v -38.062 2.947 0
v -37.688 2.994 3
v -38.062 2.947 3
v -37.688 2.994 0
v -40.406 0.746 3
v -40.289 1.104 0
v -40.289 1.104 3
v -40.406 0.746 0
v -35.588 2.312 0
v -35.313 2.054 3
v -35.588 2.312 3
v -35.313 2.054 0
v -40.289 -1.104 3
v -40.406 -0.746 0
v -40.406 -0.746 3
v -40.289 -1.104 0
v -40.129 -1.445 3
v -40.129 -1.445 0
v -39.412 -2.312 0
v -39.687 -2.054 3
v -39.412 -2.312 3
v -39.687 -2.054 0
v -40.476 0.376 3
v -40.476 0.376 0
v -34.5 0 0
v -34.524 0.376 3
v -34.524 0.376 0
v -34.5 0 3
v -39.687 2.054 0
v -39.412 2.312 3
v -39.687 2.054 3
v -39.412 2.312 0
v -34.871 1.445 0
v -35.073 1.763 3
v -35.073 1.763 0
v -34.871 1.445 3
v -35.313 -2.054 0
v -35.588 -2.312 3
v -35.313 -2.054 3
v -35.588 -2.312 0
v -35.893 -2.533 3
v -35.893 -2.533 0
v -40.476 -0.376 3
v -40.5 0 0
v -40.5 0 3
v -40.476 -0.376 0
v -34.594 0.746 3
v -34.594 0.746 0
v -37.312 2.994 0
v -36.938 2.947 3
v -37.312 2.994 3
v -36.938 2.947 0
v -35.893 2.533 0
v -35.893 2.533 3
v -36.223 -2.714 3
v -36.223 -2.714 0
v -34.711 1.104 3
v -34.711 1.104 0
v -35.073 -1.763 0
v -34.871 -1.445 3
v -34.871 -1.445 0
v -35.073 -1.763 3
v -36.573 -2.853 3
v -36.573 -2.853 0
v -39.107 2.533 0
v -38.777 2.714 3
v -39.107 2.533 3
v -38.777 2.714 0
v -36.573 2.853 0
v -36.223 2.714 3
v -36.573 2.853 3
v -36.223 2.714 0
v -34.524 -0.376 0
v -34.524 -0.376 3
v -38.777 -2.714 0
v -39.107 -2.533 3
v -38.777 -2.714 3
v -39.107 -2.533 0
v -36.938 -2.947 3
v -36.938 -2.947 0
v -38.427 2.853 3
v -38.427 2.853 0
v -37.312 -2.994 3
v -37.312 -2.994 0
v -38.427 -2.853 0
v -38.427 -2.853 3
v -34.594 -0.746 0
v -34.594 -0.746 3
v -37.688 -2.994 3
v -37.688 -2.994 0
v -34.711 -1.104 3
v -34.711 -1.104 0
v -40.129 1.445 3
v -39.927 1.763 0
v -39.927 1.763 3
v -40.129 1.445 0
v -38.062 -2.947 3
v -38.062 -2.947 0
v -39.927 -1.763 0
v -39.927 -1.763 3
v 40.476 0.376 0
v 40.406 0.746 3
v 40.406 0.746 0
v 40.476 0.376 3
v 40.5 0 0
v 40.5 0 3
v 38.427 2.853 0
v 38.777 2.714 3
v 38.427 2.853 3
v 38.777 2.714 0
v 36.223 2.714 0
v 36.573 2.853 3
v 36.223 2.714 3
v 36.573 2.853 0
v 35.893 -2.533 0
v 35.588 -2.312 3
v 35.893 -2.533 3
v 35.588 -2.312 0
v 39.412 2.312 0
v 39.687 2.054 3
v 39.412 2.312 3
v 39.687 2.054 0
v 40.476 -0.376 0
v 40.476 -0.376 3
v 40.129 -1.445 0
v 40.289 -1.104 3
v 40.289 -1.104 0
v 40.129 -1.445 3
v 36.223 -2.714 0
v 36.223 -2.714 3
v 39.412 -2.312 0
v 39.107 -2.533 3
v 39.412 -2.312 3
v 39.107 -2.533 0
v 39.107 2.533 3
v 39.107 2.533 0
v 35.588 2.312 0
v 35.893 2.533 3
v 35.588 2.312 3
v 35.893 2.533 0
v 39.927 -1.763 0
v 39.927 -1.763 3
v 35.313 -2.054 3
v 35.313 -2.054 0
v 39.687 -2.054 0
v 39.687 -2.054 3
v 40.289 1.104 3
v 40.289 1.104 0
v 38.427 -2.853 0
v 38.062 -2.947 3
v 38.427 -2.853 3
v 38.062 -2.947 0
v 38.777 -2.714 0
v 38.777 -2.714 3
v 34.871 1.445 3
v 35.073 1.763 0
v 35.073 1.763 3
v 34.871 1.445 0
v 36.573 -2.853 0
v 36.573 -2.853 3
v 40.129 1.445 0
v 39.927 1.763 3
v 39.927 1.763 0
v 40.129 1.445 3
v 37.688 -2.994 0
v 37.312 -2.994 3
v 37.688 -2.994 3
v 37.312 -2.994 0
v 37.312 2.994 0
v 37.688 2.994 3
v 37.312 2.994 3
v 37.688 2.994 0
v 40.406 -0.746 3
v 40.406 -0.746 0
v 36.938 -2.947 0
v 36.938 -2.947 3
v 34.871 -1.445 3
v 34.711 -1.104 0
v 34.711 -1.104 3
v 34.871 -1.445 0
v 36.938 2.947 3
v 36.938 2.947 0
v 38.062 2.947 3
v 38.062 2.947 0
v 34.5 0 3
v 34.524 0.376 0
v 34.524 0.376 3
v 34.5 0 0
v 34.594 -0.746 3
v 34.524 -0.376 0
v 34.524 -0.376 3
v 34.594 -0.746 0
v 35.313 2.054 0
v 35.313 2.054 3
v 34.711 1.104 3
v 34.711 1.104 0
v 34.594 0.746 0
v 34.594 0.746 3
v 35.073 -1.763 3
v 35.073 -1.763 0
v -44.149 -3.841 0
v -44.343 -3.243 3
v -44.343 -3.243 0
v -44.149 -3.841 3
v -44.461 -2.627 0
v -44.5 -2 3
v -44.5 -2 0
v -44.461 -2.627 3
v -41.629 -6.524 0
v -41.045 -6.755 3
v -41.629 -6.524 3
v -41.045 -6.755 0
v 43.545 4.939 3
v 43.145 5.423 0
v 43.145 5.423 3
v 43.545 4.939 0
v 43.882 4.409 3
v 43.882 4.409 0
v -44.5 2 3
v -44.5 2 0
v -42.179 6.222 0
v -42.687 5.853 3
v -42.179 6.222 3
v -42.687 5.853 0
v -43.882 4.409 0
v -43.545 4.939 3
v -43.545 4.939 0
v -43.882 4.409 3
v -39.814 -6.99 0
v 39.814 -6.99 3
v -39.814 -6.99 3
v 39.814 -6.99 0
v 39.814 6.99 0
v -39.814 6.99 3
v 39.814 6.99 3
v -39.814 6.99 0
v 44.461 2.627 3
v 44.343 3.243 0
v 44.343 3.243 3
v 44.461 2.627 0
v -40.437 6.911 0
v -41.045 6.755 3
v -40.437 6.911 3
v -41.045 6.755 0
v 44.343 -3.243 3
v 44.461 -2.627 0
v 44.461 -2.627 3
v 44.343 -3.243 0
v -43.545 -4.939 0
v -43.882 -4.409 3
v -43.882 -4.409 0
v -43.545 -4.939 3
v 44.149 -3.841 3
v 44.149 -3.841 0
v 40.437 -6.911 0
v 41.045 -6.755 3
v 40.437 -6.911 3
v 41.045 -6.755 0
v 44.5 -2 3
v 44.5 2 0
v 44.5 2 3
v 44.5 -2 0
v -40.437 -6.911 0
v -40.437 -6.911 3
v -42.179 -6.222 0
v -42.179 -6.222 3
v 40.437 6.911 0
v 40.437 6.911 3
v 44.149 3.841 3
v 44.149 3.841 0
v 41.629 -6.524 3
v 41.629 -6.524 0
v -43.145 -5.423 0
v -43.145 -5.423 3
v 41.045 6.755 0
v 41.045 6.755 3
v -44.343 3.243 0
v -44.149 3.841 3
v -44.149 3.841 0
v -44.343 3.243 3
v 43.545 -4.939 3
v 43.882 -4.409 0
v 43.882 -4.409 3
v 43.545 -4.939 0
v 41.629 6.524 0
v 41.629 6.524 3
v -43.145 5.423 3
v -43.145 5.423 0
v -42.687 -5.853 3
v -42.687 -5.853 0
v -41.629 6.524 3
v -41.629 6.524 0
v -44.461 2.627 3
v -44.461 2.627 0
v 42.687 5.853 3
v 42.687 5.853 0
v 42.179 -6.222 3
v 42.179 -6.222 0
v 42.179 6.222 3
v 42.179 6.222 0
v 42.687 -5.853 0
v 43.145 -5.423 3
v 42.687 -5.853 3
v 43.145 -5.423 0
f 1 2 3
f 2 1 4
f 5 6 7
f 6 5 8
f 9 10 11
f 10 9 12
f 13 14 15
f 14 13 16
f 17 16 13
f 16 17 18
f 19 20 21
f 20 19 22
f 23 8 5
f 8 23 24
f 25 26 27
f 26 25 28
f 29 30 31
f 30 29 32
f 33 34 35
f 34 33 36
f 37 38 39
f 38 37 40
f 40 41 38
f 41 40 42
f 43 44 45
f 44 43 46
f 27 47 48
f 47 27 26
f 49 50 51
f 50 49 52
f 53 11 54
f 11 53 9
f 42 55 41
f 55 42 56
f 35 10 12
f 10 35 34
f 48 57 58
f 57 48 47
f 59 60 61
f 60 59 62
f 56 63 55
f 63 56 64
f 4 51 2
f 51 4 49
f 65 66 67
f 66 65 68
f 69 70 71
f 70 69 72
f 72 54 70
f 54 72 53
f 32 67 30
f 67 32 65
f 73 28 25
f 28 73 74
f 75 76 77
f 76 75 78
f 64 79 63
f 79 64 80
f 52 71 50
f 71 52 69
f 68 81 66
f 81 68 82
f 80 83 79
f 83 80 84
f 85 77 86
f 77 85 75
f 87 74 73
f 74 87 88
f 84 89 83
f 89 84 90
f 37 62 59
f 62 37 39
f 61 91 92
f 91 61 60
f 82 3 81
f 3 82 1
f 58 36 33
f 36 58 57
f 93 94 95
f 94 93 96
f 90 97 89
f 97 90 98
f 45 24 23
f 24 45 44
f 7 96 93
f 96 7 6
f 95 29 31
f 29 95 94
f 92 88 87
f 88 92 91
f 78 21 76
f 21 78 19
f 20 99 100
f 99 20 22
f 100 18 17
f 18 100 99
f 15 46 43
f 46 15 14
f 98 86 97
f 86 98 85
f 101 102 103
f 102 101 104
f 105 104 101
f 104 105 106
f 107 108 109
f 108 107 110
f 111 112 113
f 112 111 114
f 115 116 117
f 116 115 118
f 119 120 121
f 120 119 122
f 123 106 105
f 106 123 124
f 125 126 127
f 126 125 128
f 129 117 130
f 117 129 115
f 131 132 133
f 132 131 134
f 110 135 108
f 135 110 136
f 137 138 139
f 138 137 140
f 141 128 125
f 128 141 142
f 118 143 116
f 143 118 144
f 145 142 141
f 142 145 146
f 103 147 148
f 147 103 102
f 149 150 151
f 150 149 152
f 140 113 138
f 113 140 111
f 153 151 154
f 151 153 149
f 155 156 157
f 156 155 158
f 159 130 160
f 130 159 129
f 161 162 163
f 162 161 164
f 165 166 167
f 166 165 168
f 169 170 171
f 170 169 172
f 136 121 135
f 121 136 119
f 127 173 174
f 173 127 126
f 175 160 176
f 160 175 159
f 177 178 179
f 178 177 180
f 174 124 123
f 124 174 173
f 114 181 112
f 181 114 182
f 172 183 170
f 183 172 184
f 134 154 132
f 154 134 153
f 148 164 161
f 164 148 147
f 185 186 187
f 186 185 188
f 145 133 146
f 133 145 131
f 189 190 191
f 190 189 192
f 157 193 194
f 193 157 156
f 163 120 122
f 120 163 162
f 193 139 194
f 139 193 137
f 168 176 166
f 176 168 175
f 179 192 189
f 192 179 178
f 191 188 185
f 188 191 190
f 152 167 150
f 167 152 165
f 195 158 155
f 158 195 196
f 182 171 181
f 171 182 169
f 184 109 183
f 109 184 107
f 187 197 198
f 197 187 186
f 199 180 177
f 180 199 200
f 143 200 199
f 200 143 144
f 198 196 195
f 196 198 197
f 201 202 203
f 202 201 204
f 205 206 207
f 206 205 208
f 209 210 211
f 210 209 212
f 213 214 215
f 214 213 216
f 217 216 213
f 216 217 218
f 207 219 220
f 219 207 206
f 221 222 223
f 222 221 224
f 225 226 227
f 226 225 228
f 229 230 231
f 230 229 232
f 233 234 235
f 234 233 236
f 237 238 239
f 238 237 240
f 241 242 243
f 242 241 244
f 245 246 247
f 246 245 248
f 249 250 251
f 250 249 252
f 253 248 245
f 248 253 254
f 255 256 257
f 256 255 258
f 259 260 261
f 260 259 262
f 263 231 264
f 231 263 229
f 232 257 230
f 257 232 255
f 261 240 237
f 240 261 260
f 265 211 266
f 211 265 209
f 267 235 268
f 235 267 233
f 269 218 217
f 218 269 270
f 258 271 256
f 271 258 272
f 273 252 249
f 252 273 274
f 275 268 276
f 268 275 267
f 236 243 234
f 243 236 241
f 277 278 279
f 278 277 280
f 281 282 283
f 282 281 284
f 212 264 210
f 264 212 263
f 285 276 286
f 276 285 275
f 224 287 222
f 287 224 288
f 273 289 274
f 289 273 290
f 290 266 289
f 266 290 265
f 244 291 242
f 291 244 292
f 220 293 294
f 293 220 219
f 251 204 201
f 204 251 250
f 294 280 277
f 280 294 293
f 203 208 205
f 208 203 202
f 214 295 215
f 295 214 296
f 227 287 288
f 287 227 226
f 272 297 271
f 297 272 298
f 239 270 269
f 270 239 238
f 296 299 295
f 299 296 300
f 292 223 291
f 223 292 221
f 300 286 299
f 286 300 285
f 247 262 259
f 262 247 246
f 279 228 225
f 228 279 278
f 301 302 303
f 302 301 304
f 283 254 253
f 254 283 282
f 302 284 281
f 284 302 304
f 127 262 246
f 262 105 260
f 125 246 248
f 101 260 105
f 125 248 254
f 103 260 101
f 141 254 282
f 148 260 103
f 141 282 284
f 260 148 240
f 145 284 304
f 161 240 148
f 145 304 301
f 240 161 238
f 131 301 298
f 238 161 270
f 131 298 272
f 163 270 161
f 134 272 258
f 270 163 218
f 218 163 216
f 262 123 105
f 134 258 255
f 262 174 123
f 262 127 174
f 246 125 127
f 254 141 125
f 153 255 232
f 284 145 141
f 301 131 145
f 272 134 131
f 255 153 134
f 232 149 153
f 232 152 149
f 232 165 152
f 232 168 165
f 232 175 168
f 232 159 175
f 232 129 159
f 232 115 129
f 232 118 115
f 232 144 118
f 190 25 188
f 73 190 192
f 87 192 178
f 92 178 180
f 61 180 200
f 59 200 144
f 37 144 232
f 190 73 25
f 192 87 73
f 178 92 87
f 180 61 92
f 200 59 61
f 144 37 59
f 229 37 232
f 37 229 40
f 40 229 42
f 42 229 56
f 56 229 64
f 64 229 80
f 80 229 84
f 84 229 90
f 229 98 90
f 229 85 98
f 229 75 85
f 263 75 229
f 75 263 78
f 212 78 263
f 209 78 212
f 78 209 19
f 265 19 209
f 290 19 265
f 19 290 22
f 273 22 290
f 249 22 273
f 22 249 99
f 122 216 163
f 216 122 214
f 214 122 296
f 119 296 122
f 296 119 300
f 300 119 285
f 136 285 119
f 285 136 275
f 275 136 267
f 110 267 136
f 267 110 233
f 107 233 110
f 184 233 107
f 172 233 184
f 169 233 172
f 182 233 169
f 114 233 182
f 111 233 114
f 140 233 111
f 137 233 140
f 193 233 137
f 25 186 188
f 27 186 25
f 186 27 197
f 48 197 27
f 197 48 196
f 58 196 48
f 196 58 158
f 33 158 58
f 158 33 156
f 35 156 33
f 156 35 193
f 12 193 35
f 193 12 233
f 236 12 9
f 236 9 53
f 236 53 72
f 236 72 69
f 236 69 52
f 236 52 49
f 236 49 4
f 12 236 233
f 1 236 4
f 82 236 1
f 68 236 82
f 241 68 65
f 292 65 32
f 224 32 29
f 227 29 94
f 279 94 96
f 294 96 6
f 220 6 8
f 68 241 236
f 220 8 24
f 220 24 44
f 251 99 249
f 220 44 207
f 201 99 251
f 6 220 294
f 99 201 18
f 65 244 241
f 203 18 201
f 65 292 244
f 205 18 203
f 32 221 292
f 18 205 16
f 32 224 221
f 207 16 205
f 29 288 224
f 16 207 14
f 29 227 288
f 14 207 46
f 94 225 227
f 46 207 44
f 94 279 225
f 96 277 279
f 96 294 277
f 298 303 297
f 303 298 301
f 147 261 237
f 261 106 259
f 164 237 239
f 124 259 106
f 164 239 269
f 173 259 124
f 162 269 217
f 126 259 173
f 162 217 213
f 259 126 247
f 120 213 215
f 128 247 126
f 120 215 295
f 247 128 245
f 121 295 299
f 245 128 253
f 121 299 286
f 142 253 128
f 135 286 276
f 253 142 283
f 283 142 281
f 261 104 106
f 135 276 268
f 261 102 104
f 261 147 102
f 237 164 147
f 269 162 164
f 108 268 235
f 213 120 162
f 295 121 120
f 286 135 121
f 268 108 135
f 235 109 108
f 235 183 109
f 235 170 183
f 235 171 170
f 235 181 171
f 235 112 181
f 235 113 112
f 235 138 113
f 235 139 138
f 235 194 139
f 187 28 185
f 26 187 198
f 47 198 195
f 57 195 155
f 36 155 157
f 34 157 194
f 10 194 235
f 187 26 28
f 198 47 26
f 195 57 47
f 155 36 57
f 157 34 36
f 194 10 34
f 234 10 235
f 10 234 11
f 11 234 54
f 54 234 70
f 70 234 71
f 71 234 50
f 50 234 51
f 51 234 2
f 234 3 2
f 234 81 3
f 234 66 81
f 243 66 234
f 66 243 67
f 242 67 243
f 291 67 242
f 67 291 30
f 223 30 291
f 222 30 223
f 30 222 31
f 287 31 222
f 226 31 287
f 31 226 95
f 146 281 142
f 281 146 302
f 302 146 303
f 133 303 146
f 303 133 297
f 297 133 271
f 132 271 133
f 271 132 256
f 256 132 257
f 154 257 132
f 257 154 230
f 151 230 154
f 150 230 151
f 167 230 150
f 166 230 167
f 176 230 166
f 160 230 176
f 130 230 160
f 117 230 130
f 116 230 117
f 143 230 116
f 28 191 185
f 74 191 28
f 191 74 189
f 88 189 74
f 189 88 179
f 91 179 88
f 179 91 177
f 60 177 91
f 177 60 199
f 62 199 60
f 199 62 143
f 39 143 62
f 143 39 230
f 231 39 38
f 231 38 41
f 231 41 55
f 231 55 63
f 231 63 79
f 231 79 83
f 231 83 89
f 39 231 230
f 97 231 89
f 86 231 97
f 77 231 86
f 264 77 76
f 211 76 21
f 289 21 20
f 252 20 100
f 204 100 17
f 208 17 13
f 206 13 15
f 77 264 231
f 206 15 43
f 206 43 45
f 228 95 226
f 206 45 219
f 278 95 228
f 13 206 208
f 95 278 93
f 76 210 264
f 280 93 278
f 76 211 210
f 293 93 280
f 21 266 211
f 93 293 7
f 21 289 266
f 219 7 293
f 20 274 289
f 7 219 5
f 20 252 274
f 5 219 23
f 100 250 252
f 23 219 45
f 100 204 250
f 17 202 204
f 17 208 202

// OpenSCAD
$fn = 50;


difference() {
	union() {
		hull() {
			translate(v = [-39.5000000000, 2.0000000000, 0]) {
				cylinder(h = 3, r = 5);
			}
			translate(v = [39.5000000000, 2.0000000000, 0]) {
				cylinder(h = 3, r = 5);
			}
			translate(v = [-39.5000000000, -2.0000000000, 0]) {
				cylinder(h = 3, r = 5);
			}
			translate(v = [39.5000000000, -2.0000000000, 0]) {
				cylinder(h = 3, r = 5);
			}
		}
	}
	union() {
		translate(v = [-37.5000000000, 0.0000000000, -100.0000000000]) {
			cylinder(h = 200, r = 3.0000000000);
		}
		translate(v = [-37.5000000000, 0.0000000000, -100.0000000000]) {
			cylinder(h = 200, r = 3.0000000000);
		}
		translate(v = [37.5000000000, 0.0000000000, -100.0000000000]) {
			cylinder(h = 200, r = 3.0000000000);
		}
		translate(v = [37.5000000000, 0.0000000000, -100.0000000000]) {
			cylinder(h = 200, r = 3.0000000000);
		}
	}
}
